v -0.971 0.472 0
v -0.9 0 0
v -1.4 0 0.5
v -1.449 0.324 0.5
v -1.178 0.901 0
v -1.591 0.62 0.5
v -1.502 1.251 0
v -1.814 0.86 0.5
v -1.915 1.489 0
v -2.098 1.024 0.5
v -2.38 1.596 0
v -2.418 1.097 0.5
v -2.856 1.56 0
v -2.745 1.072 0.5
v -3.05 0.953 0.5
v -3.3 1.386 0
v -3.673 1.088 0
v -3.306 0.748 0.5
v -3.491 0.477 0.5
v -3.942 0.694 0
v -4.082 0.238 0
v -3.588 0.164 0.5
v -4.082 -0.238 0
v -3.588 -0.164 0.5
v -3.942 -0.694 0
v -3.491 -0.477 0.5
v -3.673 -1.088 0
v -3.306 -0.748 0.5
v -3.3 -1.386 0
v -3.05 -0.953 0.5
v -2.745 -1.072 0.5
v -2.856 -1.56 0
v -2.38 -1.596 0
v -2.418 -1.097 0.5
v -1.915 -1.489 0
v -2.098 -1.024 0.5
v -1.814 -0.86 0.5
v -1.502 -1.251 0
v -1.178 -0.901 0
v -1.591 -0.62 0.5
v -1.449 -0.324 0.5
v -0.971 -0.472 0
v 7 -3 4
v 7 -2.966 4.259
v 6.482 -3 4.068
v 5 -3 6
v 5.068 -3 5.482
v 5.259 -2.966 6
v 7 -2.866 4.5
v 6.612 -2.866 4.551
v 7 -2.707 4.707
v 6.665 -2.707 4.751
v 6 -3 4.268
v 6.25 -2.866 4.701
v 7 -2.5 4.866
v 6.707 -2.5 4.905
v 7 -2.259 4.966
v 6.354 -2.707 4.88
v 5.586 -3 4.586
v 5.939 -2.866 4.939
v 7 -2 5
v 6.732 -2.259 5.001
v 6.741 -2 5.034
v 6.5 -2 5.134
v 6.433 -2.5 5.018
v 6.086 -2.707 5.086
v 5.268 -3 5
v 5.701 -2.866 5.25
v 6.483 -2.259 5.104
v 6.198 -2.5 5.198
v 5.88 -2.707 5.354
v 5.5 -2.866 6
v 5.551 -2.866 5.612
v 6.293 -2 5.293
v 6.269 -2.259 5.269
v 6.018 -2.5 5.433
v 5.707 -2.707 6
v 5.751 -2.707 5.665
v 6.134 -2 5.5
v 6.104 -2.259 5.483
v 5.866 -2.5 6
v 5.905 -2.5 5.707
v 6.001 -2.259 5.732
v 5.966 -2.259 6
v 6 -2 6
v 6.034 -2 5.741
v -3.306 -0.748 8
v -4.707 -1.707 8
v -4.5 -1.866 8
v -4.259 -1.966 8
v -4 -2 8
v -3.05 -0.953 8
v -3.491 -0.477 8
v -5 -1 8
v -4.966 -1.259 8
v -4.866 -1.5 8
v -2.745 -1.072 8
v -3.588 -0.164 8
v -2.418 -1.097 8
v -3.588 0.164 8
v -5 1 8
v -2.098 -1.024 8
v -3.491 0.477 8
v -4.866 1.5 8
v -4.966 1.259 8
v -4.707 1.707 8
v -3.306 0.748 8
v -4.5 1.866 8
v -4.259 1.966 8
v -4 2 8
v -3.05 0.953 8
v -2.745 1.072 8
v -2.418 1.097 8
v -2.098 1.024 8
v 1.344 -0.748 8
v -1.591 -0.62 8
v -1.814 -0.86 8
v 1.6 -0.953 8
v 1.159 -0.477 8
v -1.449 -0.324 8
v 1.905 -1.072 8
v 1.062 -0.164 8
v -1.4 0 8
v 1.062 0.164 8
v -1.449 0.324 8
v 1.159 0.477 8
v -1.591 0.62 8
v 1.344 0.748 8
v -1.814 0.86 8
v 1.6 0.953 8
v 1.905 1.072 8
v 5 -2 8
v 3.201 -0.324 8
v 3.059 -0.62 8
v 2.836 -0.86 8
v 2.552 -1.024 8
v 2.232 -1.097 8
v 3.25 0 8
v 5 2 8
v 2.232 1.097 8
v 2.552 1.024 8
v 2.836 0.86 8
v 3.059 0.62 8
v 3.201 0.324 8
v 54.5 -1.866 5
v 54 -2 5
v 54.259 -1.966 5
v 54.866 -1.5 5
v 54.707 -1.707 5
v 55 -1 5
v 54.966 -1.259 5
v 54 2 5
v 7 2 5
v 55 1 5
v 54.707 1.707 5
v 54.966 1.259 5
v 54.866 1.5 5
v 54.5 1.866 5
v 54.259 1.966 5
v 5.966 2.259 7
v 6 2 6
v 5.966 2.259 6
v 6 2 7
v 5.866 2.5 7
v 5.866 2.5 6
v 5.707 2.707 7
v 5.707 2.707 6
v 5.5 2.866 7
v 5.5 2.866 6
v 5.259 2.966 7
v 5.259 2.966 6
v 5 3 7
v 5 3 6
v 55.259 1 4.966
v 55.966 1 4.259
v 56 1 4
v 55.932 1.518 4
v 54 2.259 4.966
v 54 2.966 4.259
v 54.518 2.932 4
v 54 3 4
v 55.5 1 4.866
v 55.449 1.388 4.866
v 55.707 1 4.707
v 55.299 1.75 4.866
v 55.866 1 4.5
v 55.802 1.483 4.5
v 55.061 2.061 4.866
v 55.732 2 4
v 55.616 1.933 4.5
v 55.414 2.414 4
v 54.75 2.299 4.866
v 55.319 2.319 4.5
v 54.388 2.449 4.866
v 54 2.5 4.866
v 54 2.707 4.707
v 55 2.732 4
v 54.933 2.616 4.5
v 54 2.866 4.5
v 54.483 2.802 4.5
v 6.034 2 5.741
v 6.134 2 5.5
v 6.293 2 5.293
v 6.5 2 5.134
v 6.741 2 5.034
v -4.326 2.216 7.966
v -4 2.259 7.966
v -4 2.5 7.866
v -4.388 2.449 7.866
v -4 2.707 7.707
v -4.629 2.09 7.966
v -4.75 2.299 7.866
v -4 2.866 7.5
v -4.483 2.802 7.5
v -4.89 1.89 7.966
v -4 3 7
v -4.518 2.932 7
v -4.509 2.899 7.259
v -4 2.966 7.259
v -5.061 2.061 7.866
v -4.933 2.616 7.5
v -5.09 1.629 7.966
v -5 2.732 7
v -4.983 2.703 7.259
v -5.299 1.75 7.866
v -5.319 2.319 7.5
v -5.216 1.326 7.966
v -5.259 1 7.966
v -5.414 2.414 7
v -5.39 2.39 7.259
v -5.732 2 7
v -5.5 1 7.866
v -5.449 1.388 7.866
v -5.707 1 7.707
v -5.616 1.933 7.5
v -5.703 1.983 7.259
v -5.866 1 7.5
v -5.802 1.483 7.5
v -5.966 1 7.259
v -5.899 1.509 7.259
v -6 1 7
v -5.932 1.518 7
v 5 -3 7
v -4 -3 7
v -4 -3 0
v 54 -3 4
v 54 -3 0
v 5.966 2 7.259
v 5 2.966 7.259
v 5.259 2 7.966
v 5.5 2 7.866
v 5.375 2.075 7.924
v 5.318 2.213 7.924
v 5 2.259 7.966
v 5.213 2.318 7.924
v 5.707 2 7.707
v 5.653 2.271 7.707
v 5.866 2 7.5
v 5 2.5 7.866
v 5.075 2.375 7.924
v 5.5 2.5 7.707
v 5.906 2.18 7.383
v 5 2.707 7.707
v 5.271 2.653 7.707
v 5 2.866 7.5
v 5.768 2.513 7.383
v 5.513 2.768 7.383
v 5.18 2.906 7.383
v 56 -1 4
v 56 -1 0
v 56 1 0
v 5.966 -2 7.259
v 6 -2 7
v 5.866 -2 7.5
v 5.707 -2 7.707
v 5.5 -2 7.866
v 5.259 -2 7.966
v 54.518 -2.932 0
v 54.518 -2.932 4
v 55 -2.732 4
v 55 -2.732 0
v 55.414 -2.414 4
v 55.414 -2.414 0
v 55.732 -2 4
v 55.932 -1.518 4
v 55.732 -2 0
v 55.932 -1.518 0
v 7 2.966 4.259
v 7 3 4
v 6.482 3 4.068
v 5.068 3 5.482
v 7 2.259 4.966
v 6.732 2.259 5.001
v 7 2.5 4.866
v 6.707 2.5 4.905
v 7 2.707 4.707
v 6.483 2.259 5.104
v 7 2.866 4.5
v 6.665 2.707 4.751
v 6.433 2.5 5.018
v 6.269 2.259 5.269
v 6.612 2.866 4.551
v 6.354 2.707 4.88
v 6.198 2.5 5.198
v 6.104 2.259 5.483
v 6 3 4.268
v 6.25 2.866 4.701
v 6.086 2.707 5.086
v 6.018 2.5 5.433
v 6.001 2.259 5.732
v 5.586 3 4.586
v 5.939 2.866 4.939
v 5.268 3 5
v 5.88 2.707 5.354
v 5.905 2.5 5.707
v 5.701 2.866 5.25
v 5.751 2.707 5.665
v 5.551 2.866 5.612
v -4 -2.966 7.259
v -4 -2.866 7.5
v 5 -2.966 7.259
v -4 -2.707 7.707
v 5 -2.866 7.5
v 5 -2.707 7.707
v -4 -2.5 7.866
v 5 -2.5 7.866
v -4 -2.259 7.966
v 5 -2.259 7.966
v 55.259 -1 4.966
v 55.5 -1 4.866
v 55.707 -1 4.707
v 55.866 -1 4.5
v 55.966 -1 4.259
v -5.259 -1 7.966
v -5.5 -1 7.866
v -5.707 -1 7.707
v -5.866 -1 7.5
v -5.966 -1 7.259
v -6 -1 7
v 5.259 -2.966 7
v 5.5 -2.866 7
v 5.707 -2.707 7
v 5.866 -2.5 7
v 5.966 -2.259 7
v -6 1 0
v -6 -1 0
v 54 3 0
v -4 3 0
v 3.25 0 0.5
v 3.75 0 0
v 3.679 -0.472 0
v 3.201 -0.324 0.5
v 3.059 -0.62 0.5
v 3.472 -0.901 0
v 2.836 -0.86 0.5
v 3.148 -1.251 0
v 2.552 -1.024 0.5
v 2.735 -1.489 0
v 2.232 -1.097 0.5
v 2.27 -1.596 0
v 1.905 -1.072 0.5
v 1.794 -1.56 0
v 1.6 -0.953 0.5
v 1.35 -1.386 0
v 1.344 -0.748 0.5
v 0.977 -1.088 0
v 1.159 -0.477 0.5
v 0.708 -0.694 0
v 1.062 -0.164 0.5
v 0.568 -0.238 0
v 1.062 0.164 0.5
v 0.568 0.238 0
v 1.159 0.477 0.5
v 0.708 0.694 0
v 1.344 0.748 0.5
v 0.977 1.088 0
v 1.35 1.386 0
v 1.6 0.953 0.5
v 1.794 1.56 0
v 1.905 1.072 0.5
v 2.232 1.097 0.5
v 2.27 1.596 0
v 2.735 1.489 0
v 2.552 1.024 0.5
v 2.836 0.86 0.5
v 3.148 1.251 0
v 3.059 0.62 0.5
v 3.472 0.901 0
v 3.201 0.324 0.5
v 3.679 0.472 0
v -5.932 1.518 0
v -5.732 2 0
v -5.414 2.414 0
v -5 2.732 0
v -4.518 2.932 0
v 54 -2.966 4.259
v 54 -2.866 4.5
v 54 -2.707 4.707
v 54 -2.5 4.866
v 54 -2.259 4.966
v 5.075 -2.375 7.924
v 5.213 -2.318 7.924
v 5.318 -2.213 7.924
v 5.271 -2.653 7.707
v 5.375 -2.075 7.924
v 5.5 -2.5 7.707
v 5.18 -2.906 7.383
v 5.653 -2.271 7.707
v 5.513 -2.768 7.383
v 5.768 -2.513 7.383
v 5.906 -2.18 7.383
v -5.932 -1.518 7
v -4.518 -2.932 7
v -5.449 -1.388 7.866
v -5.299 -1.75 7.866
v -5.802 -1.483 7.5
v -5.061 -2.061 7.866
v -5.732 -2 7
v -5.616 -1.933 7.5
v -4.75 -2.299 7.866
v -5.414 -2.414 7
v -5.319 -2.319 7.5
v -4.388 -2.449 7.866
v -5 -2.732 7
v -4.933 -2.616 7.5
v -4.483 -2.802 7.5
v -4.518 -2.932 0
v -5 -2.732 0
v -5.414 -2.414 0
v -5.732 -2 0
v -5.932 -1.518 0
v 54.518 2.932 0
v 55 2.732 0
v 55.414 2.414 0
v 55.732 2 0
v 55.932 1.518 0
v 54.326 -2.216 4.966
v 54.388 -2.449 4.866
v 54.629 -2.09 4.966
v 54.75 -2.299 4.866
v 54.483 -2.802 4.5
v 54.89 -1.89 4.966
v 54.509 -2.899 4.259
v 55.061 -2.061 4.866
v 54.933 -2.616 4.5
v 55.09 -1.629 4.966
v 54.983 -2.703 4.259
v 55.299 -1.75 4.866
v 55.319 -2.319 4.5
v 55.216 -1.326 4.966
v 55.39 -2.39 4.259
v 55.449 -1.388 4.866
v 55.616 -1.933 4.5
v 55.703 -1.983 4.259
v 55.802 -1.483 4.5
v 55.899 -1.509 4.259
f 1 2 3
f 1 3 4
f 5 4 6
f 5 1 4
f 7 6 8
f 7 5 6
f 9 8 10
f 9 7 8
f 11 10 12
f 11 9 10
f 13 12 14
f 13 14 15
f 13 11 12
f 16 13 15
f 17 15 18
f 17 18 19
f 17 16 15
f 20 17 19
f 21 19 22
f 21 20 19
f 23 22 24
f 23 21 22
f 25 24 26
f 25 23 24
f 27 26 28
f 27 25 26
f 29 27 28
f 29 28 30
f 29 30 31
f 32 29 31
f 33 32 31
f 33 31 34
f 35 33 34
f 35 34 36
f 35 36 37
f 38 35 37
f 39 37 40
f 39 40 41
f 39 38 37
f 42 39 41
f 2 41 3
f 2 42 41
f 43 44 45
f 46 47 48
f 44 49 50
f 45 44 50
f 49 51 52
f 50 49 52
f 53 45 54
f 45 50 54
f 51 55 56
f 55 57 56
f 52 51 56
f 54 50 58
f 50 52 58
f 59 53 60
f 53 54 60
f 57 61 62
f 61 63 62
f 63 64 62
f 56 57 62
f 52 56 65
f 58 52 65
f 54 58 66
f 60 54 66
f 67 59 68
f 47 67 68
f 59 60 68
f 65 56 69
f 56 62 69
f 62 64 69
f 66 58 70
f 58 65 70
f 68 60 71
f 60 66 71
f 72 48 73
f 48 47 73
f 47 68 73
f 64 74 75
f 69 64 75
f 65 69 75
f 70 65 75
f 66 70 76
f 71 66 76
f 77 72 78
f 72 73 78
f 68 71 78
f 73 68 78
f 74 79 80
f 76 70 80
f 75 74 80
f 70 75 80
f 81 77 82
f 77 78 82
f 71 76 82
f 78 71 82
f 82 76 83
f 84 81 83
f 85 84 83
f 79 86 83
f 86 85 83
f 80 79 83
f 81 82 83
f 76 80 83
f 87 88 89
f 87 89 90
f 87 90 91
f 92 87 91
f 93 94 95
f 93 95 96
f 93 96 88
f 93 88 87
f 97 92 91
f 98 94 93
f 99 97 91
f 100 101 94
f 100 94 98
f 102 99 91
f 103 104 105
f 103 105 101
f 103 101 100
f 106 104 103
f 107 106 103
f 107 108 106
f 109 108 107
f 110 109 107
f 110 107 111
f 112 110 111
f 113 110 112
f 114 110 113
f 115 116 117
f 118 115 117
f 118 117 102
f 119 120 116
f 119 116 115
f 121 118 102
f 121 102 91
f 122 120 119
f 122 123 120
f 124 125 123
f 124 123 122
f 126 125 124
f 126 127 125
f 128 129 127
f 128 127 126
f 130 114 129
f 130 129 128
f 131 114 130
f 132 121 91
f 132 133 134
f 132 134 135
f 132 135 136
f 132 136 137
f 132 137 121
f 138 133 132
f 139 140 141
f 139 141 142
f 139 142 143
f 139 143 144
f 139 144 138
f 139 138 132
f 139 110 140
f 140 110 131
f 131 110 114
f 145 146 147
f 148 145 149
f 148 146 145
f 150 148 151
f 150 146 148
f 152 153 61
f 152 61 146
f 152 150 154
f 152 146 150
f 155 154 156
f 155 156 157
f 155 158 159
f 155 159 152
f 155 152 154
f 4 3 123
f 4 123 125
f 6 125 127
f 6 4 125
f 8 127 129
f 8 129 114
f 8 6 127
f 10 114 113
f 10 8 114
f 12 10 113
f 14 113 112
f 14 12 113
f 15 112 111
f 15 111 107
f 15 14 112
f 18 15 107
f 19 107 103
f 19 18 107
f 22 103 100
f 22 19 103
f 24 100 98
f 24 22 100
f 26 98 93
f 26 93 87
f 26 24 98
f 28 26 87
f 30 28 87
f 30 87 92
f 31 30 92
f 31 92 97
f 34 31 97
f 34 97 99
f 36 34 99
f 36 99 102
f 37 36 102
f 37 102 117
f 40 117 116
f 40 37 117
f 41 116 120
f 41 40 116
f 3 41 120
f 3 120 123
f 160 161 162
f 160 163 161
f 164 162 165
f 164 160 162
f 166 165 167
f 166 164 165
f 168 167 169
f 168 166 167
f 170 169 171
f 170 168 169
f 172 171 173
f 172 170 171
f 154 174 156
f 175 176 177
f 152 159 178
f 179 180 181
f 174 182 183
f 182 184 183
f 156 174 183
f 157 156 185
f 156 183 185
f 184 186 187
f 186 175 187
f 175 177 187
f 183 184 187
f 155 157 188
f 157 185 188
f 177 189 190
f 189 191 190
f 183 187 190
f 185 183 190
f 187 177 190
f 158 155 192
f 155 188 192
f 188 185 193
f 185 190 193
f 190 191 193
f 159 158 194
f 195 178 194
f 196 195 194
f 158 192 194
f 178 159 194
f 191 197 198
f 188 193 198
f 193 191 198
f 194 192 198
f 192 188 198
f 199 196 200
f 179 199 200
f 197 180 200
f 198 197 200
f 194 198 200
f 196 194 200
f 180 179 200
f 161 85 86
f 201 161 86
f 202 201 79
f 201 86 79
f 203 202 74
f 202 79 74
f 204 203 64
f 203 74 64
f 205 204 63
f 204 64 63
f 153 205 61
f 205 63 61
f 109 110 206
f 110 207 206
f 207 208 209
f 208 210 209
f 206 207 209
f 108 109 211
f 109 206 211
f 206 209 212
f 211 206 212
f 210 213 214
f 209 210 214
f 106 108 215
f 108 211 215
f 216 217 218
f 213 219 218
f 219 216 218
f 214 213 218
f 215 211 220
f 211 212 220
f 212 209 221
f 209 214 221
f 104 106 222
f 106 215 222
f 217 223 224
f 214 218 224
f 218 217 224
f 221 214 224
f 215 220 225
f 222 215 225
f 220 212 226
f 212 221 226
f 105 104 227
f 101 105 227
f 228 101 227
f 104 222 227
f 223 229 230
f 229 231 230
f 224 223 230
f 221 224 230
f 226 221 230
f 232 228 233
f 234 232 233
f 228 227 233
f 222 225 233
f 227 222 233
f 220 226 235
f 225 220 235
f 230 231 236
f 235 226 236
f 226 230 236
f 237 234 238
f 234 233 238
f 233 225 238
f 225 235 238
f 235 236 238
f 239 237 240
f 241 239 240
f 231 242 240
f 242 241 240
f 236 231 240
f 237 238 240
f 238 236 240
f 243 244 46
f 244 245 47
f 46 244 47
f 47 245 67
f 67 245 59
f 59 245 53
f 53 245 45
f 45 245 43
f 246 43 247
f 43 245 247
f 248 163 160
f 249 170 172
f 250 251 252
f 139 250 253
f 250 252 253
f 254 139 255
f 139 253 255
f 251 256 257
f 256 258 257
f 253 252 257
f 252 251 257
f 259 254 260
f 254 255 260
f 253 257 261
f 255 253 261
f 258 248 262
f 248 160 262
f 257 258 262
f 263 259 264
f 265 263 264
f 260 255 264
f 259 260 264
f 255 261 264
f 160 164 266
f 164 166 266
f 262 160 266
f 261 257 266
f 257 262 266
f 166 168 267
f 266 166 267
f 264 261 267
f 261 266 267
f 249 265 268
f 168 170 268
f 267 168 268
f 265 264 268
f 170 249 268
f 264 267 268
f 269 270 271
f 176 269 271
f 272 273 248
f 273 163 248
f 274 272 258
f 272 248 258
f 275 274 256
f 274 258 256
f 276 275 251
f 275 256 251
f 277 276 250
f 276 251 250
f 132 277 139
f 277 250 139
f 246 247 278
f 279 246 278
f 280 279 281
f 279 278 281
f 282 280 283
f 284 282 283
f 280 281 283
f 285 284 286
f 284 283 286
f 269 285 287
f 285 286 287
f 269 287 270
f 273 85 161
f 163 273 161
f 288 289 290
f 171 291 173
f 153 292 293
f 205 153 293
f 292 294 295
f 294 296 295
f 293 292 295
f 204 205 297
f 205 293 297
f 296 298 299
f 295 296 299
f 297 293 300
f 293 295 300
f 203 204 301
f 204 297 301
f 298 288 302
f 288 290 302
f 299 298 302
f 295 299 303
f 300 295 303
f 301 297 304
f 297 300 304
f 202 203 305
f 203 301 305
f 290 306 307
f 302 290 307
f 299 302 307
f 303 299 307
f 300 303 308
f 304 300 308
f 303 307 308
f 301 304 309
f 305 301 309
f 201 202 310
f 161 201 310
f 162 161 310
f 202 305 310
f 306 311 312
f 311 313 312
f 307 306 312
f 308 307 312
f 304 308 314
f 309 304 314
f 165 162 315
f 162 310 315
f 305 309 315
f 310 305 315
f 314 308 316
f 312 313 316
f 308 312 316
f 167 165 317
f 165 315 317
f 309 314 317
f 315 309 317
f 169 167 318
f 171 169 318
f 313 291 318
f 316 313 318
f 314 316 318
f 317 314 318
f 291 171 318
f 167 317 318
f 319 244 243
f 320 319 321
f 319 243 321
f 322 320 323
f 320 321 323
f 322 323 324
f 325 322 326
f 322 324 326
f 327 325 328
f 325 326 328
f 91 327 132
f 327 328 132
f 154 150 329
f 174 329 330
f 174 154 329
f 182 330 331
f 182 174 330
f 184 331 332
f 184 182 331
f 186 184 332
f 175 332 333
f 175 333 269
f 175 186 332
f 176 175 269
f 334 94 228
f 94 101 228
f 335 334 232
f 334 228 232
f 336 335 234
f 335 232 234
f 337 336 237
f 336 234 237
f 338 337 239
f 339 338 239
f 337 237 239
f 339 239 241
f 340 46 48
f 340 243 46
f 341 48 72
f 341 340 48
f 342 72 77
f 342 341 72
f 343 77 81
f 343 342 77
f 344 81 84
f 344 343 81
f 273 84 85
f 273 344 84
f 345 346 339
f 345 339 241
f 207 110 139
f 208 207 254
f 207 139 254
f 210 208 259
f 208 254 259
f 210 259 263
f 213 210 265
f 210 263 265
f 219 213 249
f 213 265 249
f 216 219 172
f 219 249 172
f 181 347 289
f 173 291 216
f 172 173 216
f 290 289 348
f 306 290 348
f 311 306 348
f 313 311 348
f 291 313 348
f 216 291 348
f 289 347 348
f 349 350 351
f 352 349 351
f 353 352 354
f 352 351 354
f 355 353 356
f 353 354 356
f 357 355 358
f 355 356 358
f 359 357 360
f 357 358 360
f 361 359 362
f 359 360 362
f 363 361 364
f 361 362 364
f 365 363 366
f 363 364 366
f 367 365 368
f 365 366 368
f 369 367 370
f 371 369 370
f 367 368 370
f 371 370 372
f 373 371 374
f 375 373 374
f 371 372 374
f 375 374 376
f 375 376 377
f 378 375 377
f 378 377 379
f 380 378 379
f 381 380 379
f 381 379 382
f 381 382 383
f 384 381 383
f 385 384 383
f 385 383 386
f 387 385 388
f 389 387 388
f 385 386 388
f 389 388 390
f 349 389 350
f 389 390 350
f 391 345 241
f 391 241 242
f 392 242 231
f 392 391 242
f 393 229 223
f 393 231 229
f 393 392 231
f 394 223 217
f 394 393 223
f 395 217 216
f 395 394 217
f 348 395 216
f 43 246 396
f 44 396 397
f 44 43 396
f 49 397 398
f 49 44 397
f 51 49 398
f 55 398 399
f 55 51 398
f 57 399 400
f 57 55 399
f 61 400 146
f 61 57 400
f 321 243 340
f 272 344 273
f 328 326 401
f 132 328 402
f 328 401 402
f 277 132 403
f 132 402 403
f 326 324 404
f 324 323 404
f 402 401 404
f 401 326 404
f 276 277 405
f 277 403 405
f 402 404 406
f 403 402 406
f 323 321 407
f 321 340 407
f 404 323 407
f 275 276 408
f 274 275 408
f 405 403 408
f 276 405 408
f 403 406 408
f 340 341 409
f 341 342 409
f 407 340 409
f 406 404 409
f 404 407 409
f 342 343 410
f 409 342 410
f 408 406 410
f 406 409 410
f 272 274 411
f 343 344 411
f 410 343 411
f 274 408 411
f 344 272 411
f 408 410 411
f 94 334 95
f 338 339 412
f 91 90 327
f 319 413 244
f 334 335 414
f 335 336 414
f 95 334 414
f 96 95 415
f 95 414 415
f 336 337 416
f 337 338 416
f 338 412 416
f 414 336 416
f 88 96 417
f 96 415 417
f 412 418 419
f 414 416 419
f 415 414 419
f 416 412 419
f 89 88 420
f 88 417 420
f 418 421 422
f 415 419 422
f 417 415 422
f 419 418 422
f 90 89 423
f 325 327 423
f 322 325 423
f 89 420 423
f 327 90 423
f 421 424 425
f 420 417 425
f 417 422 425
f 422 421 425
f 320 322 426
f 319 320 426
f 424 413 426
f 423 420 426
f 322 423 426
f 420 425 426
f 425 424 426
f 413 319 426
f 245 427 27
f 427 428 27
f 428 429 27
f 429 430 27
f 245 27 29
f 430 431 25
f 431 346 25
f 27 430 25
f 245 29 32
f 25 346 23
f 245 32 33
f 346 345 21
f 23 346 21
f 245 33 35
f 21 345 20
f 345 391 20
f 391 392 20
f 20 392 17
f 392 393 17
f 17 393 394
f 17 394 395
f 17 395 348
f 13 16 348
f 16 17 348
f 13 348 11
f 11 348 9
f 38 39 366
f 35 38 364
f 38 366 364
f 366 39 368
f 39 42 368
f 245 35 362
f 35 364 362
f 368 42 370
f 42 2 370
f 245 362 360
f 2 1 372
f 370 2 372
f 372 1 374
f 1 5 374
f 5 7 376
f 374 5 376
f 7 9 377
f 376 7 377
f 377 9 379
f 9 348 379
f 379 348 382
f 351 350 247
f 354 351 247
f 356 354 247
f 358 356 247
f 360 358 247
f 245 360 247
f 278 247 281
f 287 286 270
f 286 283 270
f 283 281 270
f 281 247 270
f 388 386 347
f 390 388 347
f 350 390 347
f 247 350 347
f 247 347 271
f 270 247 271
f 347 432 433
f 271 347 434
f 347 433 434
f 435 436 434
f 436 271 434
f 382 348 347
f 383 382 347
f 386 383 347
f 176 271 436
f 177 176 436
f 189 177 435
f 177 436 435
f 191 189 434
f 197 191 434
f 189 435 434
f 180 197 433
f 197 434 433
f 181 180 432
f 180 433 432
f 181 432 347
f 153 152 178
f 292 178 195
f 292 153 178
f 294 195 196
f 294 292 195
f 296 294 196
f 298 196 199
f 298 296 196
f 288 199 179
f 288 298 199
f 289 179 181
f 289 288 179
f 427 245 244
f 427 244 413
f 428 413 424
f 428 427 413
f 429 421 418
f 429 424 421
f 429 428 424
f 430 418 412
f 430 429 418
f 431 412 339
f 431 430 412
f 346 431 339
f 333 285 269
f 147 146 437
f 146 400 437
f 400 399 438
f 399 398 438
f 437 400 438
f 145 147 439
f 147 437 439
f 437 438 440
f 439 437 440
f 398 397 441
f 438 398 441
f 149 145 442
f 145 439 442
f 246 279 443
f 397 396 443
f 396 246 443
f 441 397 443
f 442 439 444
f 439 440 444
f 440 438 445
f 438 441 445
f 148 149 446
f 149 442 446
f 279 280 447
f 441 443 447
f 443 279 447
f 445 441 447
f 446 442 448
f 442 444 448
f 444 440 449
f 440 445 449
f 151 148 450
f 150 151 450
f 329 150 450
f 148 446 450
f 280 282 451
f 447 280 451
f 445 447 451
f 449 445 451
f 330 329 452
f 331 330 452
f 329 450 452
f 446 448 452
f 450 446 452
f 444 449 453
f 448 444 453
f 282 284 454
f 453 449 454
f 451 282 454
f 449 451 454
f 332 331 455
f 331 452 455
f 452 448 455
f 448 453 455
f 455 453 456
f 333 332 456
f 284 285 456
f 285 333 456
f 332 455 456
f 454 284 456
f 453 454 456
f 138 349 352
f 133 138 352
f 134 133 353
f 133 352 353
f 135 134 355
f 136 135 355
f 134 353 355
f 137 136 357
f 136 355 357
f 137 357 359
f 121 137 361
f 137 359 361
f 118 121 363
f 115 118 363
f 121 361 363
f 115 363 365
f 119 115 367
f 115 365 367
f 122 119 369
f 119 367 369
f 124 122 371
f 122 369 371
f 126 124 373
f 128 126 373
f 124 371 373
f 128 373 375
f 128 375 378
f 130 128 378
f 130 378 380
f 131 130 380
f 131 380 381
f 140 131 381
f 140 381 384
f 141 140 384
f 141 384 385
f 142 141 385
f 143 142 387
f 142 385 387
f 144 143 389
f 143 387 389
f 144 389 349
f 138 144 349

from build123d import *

# Parameters (mm, degrees)
F0_W         = 12
F0_H         = 6
F0_R         = 1.1
F1_DEPTH     = 8
F3_DEPTH     = 5
F4_SIZE      = 0.5
F5_F1_R      = 1
F5_F2_R      = 1
F6_T1_DEPTH  = 13
F6_T3_DEPTH  = 10
F6_T6_ANGLE  = 90
F6_T8_ANGLE  = 90
F6_T10_ANGLE = 90
F6_T12_ANGLE = 90


# Not quite as in the source:
# - a fillet or chamfer that OpenCascade refuses, or shapes differently, is made with other operations: its cross-section is extruded or revolved along the edge and cut away or added


with BuildPart() as f1:
    # F0 (on Top) → F1 (new body)
    with BuildSketch(Plane.XY):
        Rectangle(F0_W, F0_H)
        with Locations((-2.5, 0)):
            Circle(F0_R, mode=Mode.SUBTRACT)
        with BuildLine():
            ThreePointArc((1.05, 0), (2.15, 1.1), (3.25, 0))
            ThreePointArc((3.25, 0), (2.15, -1.1), (1.05, 0))
        make_face(mode=Mode.SUBTRACT)
    extrude(amount=F1_DEPTH)

    # F2 (on Top) → F3 (join)
    with BuildSketch(Plane.XY):
        Polygon((56, -3), (56, 0), (56, 3), (6, 3), (6, 0), (6, -3), align=None)
    extrude(amount=F3_DEPTH)

    # F4
    f4_edges = [f1.edges().sort_by_distance(p)[0] for p in [
        (-3.6, 0, 0),
        (1.05, 0, 0),
    ]]
    chamfer(f4_edges, length=F4_SIZE)

    # F5: fillet of radius 1 on 8 edges, made by hand

    # F5_f1
    f5_f1_edges = [f1.edges().sort_by_distance(p)[0] for p in [
        (6, 0, 5),
    ]]
    fillet(f5_f1_edges, radius=F5_F1_R)

    # F5_f2
    f5_f2_edges = [f1.edges().sort_by_distance(p)[0] for p in [
        (6, -3, 7),
        (6, 3, 7),
        (56, 0, 5),
        (0, -3, 8),
        (6, 0, 8),
        (0, 3, 8),
        (-6, 0, 8),
        (6.2928932188, 3, 5.2928932188),
        (6.2928932188, -3, 5.2928932188),
    ]]
    fillet(f5_f2_edges, radius=F5_F2_R)

    # F6: fillet of radius 2 on 4 edges, made by hand

    # F6_s2 → F6_t1 (cut)
    with BuildSketch(Plane.XY.offset(-5)):
        with BuildLine():
            ThreePointArc((-4, -3), (-5.4142135624, -2.4142135624), (-6, -1))
            Line((-6, -1), (-6, -3))
            Line((-6, -3), (-4, -3))
        make_face()
        with BuildLine():
            ThreePointArc((-6, 1), (-5.4142135624, 2.4142135624), (-4, 3))
            Line((-4, 3), (-6, 3))
            Line((-6, 3), (-6, 1))
        make_face()
    extrude(amount=F6_T1_DEPTH, mode=Mode.SUBTRACT)

    # F6_s4 → F6_t3 (cut)
    with BuildSketch(Plane.XY.offset(-5)):
        with BuildLine():
            ThreePointArc((54, -3), (55.4142135624, -2.4142135624), (56, -1))
            Line((56, -1), (56, -3))
            Line((56, -3), (54, -3))
        make_face()
        with BuildLine():
            ThreePointArc((56, 1), (55.4142135624, 2.4142135624), (54, 3))
            Line((54, 3), (56, 3))
            Line((56, 3), (56, 1))
        make_face()
    extrude(amount=F6_T3_DEPTH, mode=Mode.SUBTRACT)

    # F6_s5 → F6_t6 (revolve, cut)
    with BuildSketch(Plane.XZ.offset(-1)):
        with BuildLine():
            ThreePointArc((55, 5), (55.7071067812, 4.7071067812), (56, 4))
            Line((56, 4), (56, 5))
            Line((56, 5), (55, 5))
        make_face()
    revolve(axis=Axis((54, 1, 5), (0, 0, 1)), revolution_arc=F6_T6_ANGLE, mode=Mode.SUBTRACT)

    # F6_s7 → F6_t8 (revolve, cut)
    with BuildSketch(Plane.YZ.offset(54)):
        with BuildLine():
            ThreePointArc((-2, 5), (-2.7071067812, 4.7071067812), (-3, 4))
            Line((-3, 4), (-3, 5))
            Line((-3, 5), (-2, 5))
        make_face()
    revolve(axis=Axis((54, -1, 5), (0, 0, 1)), revolution_arc=F6_T8_ANGLE, mode=Mode.SUBTRACT)

    # F6_s9 → F6_t10 (revolve, cut)
    with BuildSketch(Plane.YZ.offset(-4)):
        with BuildLine():
            ThreePointArc((2, 8), (2.7071067812, 7.7071067812), (3, 7))
            Line((3, 7), (3, 8))
            Line((3, 8), (2, 8))
        make_face()
    revolve(axis=Axis((-4, 1, 8), (0, 0, 1)), revolution_arc=F6_T10_ANGLE, mode=Mode.SUBTRACT)

    # F6_s11 → F6_t12 (revolve, cut)
    with BuildSketch(Plane.XZ.offset(1)):
        with BuildLine():
            ThreePointArc((-5, 8), (-5.7071067812, 7.7071067812), (-6, 7))
            Line((-6, 7), (-6, 8))
            Line((-6, 8), (-5, 8))
        make_face()
    revolve(axis=Axis((-4, -1, 8), (0, 0, 1)), revolution_arc=F6_T12_ANGLE, mode=Mode.SUBTRACT)


solid = f1.part
